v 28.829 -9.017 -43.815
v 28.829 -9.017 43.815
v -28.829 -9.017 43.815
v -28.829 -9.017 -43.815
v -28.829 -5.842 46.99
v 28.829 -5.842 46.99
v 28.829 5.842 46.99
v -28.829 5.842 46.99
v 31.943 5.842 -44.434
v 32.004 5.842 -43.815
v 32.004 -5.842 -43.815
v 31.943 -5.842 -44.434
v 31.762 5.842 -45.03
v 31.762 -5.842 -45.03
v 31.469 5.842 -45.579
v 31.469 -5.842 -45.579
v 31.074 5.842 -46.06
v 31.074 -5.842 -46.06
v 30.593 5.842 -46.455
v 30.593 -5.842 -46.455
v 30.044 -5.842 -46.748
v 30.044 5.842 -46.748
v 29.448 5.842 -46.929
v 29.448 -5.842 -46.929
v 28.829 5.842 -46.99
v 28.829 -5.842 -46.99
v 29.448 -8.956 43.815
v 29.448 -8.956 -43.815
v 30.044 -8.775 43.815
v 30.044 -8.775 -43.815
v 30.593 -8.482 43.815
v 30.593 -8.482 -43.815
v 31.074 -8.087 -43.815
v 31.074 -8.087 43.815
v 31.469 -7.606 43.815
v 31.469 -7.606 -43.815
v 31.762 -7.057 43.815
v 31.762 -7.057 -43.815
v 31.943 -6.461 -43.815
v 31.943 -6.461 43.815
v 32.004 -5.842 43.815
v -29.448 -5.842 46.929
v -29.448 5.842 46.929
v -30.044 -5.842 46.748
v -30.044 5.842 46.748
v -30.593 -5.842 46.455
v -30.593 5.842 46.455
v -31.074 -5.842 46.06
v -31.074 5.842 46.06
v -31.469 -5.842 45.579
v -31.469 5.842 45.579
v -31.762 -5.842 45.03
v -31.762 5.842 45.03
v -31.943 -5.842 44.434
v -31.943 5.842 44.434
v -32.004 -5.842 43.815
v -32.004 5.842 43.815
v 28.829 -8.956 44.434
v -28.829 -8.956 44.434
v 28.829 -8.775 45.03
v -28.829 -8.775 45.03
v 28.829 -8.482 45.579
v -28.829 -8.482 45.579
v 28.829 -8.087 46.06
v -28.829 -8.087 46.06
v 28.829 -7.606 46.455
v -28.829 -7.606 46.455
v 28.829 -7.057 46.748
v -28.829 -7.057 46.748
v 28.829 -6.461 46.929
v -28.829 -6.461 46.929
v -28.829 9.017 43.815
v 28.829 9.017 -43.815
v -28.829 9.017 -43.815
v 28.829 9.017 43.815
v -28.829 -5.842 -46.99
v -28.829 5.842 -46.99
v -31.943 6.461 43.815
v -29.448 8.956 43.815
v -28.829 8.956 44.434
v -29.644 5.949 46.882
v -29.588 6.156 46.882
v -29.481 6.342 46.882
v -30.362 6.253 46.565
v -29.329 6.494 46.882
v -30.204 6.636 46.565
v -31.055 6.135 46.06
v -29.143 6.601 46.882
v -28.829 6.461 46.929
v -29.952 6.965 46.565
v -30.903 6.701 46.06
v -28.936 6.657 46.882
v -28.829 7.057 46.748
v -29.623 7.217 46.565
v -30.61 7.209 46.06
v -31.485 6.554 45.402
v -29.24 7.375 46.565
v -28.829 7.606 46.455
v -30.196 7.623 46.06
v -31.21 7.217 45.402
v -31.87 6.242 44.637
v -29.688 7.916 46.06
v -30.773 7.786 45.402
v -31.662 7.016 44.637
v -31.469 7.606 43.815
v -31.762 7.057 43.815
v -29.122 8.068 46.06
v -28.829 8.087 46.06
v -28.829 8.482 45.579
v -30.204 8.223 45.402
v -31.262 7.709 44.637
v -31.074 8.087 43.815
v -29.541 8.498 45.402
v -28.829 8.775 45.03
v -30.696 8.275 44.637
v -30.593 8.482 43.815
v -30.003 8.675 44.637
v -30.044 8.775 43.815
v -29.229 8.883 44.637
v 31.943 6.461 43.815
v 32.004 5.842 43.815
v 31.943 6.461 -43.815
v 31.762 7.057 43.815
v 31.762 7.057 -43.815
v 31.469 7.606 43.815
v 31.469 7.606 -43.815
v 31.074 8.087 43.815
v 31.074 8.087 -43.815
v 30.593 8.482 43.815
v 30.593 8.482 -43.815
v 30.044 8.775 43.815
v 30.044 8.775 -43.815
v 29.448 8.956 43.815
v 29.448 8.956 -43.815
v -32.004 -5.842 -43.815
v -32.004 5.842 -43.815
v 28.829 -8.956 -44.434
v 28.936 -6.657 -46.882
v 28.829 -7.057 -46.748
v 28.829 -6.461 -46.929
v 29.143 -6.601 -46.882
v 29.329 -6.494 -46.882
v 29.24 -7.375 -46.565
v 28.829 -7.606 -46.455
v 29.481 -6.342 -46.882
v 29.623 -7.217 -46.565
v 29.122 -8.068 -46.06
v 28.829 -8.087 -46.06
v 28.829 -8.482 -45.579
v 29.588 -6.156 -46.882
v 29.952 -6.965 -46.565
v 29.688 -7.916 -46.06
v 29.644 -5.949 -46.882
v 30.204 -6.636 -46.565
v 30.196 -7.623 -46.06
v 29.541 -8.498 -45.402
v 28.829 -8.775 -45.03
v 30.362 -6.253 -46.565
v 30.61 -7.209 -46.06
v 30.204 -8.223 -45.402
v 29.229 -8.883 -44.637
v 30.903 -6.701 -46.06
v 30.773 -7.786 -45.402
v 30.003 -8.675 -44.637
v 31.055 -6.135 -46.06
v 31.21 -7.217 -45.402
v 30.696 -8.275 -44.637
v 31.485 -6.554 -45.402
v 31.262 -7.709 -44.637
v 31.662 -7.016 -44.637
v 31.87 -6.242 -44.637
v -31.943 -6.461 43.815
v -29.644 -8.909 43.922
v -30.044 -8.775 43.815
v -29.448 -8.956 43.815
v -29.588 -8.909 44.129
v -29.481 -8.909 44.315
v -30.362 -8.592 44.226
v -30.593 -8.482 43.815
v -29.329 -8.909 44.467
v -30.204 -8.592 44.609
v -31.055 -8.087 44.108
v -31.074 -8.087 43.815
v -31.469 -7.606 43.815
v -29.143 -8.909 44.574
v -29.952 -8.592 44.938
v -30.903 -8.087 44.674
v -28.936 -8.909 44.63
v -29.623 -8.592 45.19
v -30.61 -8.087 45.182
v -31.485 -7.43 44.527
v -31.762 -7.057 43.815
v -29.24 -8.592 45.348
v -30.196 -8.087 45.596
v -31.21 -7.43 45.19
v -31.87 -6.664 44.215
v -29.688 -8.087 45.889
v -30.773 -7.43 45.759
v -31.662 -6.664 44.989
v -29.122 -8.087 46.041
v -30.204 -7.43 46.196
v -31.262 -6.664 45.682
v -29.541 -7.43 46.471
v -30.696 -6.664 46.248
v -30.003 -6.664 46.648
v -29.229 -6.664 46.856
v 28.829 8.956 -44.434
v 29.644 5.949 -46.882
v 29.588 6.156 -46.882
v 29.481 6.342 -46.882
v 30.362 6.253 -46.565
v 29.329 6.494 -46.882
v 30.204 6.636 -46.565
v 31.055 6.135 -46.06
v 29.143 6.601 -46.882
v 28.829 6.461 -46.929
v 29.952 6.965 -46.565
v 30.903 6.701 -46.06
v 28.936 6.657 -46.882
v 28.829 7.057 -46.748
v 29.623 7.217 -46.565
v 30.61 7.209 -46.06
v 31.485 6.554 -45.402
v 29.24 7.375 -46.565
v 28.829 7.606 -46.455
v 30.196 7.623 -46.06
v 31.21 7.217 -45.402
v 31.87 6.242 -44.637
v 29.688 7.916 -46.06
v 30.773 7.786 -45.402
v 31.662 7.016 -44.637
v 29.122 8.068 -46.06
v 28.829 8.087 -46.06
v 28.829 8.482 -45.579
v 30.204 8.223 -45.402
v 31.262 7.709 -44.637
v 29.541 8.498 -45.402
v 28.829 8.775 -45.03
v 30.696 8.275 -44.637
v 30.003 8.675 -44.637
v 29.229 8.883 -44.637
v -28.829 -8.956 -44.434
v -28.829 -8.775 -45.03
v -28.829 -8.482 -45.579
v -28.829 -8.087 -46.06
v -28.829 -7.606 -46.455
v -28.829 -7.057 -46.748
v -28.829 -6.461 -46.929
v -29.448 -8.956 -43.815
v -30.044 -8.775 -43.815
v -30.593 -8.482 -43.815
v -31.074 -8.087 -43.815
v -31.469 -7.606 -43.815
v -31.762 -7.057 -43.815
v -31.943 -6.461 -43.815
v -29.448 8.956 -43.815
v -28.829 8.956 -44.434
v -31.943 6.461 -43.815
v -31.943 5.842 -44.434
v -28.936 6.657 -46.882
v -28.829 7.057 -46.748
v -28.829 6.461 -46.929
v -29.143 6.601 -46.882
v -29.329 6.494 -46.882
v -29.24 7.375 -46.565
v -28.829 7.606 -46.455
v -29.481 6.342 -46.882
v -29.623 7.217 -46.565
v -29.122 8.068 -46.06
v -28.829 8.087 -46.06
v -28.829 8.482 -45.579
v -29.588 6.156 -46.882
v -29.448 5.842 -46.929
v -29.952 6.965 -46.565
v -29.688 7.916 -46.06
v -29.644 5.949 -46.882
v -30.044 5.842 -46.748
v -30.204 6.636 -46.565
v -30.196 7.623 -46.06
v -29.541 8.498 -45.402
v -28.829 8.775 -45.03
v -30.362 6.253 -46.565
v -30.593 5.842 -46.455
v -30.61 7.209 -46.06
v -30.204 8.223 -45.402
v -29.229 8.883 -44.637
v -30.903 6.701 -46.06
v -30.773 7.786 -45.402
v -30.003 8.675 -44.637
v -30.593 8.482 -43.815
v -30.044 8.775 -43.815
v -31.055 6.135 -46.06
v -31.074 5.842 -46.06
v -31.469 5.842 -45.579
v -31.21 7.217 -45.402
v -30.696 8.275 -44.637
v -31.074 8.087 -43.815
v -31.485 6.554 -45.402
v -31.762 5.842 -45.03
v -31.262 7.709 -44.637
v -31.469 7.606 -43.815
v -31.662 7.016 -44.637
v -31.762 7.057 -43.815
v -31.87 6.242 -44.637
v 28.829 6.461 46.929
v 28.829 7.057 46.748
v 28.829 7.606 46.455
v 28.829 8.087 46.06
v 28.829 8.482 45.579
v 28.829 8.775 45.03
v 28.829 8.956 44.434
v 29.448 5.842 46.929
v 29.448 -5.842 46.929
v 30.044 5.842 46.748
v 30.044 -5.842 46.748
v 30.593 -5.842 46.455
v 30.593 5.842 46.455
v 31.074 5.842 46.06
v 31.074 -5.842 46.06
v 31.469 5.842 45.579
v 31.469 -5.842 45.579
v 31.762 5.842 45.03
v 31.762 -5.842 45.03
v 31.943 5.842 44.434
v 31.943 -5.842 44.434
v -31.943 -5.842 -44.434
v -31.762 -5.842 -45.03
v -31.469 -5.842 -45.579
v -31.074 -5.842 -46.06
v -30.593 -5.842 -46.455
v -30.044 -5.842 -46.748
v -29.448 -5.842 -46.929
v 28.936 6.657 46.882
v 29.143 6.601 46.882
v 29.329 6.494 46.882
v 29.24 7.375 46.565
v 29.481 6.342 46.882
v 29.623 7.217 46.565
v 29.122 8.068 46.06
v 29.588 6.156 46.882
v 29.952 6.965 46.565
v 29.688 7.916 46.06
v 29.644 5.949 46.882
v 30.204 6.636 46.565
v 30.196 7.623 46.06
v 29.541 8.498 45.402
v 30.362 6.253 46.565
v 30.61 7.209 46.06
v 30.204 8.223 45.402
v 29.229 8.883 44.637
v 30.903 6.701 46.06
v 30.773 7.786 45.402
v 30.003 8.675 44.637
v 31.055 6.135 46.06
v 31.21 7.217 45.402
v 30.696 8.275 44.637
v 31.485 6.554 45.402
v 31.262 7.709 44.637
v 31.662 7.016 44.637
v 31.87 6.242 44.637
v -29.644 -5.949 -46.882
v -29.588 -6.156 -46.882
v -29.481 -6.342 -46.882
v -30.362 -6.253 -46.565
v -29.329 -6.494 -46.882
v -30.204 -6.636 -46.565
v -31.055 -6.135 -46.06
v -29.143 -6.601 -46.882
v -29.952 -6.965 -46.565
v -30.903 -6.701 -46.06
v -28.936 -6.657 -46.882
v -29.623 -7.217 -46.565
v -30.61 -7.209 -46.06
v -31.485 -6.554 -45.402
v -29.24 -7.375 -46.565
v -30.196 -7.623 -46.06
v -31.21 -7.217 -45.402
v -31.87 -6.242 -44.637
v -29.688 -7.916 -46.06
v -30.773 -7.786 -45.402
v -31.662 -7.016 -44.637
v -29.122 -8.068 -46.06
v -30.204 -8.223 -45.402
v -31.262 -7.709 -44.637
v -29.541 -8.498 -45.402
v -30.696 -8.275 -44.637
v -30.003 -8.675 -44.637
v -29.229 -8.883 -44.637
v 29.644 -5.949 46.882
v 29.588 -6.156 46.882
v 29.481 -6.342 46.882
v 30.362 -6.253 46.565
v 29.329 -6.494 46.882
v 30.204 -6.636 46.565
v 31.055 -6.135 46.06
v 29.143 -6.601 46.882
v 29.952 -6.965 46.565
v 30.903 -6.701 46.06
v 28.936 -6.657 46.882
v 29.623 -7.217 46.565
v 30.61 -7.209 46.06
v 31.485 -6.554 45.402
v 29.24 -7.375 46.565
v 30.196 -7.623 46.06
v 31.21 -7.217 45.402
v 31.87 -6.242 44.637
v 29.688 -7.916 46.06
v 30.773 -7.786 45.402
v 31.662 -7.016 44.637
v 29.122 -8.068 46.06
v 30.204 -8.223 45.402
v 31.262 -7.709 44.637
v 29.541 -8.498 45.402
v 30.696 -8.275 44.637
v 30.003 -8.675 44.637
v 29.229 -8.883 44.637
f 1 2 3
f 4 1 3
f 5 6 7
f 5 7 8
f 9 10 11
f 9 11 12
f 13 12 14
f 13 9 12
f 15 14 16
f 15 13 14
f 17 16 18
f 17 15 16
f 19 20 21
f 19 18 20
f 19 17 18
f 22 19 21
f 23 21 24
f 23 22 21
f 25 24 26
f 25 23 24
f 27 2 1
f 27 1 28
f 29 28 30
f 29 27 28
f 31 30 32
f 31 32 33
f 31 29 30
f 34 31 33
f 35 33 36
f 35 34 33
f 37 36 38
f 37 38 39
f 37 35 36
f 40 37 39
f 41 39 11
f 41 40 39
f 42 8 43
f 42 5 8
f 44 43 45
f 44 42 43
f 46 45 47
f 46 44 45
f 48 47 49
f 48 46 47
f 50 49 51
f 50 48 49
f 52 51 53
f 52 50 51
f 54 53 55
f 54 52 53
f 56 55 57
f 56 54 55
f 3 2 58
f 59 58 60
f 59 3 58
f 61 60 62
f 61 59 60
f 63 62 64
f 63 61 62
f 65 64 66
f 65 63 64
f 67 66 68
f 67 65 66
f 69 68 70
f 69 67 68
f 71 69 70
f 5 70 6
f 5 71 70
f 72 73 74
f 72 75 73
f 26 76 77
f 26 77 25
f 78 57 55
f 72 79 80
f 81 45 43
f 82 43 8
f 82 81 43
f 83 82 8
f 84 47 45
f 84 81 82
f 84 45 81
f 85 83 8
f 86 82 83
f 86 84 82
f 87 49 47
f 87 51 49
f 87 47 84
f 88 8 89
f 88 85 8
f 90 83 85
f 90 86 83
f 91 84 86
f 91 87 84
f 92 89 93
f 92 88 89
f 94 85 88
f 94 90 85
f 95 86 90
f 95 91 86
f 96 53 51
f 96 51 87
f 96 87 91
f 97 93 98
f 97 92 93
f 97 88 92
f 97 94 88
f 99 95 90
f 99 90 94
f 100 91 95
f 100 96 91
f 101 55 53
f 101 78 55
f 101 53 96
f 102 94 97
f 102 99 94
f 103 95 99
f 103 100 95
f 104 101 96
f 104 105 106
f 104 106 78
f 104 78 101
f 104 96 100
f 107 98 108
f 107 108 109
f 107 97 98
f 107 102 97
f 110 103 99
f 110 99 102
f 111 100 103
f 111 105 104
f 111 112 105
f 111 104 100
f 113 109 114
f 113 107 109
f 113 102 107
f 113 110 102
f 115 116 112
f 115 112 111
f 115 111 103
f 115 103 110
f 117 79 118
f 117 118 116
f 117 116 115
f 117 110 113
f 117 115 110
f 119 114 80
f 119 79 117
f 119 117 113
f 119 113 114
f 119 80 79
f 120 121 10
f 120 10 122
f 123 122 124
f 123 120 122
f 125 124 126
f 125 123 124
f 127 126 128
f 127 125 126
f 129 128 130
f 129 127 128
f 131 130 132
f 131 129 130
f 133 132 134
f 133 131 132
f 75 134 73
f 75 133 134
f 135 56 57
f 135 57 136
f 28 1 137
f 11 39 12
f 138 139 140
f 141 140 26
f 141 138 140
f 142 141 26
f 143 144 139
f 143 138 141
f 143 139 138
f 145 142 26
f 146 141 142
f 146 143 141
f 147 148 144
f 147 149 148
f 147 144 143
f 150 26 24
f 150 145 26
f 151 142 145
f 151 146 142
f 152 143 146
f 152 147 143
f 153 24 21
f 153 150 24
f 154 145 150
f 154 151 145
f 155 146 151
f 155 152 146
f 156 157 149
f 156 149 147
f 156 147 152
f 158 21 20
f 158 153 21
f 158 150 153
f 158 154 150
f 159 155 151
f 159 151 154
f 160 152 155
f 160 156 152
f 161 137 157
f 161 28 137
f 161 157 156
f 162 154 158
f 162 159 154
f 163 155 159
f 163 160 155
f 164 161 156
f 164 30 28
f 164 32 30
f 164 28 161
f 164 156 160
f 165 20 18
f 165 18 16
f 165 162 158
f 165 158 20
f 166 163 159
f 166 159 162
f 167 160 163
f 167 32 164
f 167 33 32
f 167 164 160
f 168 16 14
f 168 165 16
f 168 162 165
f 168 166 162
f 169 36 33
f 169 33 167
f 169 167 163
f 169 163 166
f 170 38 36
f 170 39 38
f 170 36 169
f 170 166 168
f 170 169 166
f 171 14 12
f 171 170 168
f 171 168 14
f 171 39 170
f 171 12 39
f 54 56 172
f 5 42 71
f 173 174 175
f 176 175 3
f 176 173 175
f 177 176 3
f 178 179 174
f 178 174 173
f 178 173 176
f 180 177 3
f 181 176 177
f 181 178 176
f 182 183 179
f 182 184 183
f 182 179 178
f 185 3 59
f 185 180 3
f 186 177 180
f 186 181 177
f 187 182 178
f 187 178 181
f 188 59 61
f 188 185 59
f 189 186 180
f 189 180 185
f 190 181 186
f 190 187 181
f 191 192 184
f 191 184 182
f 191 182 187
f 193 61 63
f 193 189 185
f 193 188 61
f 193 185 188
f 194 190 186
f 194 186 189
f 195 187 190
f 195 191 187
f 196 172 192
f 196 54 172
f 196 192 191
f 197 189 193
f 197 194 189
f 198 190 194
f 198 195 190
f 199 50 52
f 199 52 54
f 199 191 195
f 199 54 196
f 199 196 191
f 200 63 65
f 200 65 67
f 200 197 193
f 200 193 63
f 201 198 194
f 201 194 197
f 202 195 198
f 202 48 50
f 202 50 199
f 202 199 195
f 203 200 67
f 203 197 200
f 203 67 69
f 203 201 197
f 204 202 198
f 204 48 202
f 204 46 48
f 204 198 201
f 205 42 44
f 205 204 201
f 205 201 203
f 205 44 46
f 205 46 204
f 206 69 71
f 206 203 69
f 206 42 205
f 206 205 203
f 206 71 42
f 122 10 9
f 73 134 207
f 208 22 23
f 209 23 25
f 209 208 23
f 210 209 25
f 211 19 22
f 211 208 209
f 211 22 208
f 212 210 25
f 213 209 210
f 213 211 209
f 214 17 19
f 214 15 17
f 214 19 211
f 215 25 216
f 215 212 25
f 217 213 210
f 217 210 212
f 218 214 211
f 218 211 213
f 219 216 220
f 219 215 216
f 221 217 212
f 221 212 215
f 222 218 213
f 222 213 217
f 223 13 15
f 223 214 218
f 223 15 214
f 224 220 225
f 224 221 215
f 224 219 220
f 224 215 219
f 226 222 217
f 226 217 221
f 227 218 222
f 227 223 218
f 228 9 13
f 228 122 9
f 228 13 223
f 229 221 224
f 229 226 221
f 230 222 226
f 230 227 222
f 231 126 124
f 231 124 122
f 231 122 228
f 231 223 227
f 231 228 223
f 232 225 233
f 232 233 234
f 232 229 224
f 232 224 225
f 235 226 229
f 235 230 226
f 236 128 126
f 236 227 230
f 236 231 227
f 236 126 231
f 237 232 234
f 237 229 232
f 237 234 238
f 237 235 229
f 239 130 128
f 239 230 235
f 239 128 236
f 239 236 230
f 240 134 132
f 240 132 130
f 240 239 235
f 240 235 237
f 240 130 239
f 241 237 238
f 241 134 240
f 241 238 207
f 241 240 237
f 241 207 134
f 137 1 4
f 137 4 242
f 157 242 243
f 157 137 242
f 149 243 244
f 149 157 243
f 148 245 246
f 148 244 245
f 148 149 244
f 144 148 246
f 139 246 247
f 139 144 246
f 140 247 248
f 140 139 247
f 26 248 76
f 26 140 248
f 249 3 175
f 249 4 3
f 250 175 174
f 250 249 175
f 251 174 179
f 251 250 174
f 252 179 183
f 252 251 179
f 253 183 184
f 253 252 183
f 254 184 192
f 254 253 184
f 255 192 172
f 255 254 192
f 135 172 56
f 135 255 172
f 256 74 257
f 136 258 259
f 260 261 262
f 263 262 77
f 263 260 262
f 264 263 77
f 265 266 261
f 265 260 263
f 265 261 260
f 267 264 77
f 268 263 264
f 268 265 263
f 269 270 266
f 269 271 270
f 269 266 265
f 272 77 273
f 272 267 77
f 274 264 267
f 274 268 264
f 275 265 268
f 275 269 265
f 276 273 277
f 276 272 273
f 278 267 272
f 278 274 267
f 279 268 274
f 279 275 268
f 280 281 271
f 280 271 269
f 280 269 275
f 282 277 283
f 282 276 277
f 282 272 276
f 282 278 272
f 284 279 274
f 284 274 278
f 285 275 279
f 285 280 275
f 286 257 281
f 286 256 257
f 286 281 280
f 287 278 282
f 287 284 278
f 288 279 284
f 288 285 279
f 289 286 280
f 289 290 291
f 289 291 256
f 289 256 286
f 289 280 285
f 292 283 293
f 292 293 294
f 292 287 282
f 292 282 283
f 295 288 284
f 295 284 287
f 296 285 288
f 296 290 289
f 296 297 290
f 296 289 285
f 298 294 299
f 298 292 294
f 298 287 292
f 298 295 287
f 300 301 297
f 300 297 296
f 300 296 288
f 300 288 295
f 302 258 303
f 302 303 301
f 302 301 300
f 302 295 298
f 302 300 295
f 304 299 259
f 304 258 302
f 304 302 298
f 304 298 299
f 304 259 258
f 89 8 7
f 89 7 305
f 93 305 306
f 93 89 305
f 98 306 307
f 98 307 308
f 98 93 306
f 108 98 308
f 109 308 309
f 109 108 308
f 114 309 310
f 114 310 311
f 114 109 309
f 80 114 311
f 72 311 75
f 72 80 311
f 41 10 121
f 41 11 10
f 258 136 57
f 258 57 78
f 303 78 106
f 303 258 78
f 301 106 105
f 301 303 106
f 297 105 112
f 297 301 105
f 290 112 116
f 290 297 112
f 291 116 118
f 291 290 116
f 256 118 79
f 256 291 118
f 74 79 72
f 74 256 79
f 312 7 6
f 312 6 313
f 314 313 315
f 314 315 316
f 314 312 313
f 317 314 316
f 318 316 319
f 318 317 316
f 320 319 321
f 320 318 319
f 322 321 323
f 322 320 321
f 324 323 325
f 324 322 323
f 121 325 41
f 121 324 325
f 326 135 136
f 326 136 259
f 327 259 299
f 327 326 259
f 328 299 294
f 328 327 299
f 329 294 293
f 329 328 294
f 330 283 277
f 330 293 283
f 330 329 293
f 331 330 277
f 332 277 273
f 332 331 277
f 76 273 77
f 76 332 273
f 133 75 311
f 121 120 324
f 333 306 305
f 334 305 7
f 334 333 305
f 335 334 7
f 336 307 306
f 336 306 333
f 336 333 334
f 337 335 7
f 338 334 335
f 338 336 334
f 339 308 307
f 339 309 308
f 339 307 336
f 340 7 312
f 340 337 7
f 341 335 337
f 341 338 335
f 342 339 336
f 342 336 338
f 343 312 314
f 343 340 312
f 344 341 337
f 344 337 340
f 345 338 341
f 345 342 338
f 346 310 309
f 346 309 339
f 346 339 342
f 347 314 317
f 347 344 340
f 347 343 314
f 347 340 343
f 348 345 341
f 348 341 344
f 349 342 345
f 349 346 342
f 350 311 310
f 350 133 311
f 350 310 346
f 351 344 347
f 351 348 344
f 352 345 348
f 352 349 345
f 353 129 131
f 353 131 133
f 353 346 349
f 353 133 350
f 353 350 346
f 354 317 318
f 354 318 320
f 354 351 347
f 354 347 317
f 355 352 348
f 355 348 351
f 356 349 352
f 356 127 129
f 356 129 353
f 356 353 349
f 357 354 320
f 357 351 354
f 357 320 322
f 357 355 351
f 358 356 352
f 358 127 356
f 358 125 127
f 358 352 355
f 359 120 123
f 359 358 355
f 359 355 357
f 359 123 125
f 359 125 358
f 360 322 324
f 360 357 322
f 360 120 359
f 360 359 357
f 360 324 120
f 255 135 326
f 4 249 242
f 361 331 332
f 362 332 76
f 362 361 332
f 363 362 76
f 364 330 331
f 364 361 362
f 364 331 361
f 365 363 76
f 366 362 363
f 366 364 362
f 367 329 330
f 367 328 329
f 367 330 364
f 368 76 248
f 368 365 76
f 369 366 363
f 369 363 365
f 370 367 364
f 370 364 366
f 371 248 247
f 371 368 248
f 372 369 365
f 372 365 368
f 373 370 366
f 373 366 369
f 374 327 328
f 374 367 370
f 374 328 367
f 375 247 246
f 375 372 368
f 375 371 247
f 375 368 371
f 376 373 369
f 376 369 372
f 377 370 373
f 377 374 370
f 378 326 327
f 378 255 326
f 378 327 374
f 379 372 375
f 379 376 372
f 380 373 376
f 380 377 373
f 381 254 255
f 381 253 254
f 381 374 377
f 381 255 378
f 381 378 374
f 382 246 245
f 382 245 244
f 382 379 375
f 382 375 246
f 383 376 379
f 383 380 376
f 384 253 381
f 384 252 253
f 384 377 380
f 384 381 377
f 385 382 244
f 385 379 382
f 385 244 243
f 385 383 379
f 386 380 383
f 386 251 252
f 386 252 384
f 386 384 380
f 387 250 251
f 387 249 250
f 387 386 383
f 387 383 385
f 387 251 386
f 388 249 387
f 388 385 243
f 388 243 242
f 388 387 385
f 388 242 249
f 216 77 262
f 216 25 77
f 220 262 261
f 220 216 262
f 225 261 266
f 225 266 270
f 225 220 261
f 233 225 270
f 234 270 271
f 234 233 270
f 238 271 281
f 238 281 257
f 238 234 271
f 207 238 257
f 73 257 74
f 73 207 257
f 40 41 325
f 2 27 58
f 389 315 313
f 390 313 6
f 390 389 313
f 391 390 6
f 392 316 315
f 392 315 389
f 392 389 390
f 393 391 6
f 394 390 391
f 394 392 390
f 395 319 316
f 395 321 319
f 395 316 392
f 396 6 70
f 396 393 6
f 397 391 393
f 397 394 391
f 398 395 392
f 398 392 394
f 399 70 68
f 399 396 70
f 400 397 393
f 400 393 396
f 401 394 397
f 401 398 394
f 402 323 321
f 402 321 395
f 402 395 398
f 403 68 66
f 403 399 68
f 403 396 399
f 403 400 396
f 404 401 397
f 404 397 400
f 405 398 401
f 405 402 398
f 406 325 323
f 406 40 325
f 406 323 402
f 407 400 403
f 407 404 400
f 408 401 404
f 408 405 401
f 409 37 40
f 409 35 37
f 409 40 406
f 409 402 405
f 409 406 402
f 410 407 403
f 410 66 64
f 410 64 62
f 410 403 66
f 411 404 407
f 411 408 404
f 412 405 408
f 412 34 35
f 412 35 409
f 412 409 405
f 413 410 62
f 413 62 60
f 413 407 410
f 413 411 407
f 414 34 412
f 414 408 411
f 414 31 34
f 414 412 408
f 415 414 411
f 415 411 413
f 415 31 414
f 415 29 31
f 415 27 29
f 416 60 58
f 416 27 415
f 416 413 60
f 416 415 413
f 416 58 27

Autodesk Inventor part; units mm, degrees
ref_plane "YZ Plane" through (0, 0, 0) normal (1, 0, 0) x (0, 1, 0)
ref_plane "XZ Plane" through (0, 0, 0) normal (0, 1, 0) x (-1, 0, 0)
ref_plane "XY Plane" through (0, 0, 0) normal (0, 0, 1) x (1, 0, 0)
sketch "Sketch1" plane through (0, 0, 0) normal (0, 1, 0) x (-1, 0, 0)
  line L0 (-32.004, 46.99) -> (32.004, 46.99)
  line L1 (32.004, 46.99) -> (32.004, -46.99)
  line L2 (32.004, -46.99) -> (-32.004, -46.99)
  line L3 (-32.004, -46.99) -> (-32.004, 46.99)
  line L4 (-32.004, 46.99) -> (32.004, -46.99) construction
  line L5 (32.004, 46.99) -> (-32.004, -46.99) construction
  point P0 (0, 0)
  dimension "d0" = 64.008
  dimension "d1" = 93.98
extrude "Extrusion1" add sketch "Sketch1" along normal mid plane 18.034
fillet "Fillet1" radius 3.175 12 edges at (32.004, 9.017, 0) (32.004, -9.017, 0) (32.004, 0, 46.99) (-32.004, 9.017, 0) (0, 9.017, 46.99) (-32.004, 0, 46.99) (0, -9.017, 46.99) (-32.004, -9.017, 0) (-32.004, 0, -46.99) (0, 9.017, -46.99) (0, -9.017, -46.99) (32.004, 0, -46.99)
properties part number "ColdBye_Battery"
